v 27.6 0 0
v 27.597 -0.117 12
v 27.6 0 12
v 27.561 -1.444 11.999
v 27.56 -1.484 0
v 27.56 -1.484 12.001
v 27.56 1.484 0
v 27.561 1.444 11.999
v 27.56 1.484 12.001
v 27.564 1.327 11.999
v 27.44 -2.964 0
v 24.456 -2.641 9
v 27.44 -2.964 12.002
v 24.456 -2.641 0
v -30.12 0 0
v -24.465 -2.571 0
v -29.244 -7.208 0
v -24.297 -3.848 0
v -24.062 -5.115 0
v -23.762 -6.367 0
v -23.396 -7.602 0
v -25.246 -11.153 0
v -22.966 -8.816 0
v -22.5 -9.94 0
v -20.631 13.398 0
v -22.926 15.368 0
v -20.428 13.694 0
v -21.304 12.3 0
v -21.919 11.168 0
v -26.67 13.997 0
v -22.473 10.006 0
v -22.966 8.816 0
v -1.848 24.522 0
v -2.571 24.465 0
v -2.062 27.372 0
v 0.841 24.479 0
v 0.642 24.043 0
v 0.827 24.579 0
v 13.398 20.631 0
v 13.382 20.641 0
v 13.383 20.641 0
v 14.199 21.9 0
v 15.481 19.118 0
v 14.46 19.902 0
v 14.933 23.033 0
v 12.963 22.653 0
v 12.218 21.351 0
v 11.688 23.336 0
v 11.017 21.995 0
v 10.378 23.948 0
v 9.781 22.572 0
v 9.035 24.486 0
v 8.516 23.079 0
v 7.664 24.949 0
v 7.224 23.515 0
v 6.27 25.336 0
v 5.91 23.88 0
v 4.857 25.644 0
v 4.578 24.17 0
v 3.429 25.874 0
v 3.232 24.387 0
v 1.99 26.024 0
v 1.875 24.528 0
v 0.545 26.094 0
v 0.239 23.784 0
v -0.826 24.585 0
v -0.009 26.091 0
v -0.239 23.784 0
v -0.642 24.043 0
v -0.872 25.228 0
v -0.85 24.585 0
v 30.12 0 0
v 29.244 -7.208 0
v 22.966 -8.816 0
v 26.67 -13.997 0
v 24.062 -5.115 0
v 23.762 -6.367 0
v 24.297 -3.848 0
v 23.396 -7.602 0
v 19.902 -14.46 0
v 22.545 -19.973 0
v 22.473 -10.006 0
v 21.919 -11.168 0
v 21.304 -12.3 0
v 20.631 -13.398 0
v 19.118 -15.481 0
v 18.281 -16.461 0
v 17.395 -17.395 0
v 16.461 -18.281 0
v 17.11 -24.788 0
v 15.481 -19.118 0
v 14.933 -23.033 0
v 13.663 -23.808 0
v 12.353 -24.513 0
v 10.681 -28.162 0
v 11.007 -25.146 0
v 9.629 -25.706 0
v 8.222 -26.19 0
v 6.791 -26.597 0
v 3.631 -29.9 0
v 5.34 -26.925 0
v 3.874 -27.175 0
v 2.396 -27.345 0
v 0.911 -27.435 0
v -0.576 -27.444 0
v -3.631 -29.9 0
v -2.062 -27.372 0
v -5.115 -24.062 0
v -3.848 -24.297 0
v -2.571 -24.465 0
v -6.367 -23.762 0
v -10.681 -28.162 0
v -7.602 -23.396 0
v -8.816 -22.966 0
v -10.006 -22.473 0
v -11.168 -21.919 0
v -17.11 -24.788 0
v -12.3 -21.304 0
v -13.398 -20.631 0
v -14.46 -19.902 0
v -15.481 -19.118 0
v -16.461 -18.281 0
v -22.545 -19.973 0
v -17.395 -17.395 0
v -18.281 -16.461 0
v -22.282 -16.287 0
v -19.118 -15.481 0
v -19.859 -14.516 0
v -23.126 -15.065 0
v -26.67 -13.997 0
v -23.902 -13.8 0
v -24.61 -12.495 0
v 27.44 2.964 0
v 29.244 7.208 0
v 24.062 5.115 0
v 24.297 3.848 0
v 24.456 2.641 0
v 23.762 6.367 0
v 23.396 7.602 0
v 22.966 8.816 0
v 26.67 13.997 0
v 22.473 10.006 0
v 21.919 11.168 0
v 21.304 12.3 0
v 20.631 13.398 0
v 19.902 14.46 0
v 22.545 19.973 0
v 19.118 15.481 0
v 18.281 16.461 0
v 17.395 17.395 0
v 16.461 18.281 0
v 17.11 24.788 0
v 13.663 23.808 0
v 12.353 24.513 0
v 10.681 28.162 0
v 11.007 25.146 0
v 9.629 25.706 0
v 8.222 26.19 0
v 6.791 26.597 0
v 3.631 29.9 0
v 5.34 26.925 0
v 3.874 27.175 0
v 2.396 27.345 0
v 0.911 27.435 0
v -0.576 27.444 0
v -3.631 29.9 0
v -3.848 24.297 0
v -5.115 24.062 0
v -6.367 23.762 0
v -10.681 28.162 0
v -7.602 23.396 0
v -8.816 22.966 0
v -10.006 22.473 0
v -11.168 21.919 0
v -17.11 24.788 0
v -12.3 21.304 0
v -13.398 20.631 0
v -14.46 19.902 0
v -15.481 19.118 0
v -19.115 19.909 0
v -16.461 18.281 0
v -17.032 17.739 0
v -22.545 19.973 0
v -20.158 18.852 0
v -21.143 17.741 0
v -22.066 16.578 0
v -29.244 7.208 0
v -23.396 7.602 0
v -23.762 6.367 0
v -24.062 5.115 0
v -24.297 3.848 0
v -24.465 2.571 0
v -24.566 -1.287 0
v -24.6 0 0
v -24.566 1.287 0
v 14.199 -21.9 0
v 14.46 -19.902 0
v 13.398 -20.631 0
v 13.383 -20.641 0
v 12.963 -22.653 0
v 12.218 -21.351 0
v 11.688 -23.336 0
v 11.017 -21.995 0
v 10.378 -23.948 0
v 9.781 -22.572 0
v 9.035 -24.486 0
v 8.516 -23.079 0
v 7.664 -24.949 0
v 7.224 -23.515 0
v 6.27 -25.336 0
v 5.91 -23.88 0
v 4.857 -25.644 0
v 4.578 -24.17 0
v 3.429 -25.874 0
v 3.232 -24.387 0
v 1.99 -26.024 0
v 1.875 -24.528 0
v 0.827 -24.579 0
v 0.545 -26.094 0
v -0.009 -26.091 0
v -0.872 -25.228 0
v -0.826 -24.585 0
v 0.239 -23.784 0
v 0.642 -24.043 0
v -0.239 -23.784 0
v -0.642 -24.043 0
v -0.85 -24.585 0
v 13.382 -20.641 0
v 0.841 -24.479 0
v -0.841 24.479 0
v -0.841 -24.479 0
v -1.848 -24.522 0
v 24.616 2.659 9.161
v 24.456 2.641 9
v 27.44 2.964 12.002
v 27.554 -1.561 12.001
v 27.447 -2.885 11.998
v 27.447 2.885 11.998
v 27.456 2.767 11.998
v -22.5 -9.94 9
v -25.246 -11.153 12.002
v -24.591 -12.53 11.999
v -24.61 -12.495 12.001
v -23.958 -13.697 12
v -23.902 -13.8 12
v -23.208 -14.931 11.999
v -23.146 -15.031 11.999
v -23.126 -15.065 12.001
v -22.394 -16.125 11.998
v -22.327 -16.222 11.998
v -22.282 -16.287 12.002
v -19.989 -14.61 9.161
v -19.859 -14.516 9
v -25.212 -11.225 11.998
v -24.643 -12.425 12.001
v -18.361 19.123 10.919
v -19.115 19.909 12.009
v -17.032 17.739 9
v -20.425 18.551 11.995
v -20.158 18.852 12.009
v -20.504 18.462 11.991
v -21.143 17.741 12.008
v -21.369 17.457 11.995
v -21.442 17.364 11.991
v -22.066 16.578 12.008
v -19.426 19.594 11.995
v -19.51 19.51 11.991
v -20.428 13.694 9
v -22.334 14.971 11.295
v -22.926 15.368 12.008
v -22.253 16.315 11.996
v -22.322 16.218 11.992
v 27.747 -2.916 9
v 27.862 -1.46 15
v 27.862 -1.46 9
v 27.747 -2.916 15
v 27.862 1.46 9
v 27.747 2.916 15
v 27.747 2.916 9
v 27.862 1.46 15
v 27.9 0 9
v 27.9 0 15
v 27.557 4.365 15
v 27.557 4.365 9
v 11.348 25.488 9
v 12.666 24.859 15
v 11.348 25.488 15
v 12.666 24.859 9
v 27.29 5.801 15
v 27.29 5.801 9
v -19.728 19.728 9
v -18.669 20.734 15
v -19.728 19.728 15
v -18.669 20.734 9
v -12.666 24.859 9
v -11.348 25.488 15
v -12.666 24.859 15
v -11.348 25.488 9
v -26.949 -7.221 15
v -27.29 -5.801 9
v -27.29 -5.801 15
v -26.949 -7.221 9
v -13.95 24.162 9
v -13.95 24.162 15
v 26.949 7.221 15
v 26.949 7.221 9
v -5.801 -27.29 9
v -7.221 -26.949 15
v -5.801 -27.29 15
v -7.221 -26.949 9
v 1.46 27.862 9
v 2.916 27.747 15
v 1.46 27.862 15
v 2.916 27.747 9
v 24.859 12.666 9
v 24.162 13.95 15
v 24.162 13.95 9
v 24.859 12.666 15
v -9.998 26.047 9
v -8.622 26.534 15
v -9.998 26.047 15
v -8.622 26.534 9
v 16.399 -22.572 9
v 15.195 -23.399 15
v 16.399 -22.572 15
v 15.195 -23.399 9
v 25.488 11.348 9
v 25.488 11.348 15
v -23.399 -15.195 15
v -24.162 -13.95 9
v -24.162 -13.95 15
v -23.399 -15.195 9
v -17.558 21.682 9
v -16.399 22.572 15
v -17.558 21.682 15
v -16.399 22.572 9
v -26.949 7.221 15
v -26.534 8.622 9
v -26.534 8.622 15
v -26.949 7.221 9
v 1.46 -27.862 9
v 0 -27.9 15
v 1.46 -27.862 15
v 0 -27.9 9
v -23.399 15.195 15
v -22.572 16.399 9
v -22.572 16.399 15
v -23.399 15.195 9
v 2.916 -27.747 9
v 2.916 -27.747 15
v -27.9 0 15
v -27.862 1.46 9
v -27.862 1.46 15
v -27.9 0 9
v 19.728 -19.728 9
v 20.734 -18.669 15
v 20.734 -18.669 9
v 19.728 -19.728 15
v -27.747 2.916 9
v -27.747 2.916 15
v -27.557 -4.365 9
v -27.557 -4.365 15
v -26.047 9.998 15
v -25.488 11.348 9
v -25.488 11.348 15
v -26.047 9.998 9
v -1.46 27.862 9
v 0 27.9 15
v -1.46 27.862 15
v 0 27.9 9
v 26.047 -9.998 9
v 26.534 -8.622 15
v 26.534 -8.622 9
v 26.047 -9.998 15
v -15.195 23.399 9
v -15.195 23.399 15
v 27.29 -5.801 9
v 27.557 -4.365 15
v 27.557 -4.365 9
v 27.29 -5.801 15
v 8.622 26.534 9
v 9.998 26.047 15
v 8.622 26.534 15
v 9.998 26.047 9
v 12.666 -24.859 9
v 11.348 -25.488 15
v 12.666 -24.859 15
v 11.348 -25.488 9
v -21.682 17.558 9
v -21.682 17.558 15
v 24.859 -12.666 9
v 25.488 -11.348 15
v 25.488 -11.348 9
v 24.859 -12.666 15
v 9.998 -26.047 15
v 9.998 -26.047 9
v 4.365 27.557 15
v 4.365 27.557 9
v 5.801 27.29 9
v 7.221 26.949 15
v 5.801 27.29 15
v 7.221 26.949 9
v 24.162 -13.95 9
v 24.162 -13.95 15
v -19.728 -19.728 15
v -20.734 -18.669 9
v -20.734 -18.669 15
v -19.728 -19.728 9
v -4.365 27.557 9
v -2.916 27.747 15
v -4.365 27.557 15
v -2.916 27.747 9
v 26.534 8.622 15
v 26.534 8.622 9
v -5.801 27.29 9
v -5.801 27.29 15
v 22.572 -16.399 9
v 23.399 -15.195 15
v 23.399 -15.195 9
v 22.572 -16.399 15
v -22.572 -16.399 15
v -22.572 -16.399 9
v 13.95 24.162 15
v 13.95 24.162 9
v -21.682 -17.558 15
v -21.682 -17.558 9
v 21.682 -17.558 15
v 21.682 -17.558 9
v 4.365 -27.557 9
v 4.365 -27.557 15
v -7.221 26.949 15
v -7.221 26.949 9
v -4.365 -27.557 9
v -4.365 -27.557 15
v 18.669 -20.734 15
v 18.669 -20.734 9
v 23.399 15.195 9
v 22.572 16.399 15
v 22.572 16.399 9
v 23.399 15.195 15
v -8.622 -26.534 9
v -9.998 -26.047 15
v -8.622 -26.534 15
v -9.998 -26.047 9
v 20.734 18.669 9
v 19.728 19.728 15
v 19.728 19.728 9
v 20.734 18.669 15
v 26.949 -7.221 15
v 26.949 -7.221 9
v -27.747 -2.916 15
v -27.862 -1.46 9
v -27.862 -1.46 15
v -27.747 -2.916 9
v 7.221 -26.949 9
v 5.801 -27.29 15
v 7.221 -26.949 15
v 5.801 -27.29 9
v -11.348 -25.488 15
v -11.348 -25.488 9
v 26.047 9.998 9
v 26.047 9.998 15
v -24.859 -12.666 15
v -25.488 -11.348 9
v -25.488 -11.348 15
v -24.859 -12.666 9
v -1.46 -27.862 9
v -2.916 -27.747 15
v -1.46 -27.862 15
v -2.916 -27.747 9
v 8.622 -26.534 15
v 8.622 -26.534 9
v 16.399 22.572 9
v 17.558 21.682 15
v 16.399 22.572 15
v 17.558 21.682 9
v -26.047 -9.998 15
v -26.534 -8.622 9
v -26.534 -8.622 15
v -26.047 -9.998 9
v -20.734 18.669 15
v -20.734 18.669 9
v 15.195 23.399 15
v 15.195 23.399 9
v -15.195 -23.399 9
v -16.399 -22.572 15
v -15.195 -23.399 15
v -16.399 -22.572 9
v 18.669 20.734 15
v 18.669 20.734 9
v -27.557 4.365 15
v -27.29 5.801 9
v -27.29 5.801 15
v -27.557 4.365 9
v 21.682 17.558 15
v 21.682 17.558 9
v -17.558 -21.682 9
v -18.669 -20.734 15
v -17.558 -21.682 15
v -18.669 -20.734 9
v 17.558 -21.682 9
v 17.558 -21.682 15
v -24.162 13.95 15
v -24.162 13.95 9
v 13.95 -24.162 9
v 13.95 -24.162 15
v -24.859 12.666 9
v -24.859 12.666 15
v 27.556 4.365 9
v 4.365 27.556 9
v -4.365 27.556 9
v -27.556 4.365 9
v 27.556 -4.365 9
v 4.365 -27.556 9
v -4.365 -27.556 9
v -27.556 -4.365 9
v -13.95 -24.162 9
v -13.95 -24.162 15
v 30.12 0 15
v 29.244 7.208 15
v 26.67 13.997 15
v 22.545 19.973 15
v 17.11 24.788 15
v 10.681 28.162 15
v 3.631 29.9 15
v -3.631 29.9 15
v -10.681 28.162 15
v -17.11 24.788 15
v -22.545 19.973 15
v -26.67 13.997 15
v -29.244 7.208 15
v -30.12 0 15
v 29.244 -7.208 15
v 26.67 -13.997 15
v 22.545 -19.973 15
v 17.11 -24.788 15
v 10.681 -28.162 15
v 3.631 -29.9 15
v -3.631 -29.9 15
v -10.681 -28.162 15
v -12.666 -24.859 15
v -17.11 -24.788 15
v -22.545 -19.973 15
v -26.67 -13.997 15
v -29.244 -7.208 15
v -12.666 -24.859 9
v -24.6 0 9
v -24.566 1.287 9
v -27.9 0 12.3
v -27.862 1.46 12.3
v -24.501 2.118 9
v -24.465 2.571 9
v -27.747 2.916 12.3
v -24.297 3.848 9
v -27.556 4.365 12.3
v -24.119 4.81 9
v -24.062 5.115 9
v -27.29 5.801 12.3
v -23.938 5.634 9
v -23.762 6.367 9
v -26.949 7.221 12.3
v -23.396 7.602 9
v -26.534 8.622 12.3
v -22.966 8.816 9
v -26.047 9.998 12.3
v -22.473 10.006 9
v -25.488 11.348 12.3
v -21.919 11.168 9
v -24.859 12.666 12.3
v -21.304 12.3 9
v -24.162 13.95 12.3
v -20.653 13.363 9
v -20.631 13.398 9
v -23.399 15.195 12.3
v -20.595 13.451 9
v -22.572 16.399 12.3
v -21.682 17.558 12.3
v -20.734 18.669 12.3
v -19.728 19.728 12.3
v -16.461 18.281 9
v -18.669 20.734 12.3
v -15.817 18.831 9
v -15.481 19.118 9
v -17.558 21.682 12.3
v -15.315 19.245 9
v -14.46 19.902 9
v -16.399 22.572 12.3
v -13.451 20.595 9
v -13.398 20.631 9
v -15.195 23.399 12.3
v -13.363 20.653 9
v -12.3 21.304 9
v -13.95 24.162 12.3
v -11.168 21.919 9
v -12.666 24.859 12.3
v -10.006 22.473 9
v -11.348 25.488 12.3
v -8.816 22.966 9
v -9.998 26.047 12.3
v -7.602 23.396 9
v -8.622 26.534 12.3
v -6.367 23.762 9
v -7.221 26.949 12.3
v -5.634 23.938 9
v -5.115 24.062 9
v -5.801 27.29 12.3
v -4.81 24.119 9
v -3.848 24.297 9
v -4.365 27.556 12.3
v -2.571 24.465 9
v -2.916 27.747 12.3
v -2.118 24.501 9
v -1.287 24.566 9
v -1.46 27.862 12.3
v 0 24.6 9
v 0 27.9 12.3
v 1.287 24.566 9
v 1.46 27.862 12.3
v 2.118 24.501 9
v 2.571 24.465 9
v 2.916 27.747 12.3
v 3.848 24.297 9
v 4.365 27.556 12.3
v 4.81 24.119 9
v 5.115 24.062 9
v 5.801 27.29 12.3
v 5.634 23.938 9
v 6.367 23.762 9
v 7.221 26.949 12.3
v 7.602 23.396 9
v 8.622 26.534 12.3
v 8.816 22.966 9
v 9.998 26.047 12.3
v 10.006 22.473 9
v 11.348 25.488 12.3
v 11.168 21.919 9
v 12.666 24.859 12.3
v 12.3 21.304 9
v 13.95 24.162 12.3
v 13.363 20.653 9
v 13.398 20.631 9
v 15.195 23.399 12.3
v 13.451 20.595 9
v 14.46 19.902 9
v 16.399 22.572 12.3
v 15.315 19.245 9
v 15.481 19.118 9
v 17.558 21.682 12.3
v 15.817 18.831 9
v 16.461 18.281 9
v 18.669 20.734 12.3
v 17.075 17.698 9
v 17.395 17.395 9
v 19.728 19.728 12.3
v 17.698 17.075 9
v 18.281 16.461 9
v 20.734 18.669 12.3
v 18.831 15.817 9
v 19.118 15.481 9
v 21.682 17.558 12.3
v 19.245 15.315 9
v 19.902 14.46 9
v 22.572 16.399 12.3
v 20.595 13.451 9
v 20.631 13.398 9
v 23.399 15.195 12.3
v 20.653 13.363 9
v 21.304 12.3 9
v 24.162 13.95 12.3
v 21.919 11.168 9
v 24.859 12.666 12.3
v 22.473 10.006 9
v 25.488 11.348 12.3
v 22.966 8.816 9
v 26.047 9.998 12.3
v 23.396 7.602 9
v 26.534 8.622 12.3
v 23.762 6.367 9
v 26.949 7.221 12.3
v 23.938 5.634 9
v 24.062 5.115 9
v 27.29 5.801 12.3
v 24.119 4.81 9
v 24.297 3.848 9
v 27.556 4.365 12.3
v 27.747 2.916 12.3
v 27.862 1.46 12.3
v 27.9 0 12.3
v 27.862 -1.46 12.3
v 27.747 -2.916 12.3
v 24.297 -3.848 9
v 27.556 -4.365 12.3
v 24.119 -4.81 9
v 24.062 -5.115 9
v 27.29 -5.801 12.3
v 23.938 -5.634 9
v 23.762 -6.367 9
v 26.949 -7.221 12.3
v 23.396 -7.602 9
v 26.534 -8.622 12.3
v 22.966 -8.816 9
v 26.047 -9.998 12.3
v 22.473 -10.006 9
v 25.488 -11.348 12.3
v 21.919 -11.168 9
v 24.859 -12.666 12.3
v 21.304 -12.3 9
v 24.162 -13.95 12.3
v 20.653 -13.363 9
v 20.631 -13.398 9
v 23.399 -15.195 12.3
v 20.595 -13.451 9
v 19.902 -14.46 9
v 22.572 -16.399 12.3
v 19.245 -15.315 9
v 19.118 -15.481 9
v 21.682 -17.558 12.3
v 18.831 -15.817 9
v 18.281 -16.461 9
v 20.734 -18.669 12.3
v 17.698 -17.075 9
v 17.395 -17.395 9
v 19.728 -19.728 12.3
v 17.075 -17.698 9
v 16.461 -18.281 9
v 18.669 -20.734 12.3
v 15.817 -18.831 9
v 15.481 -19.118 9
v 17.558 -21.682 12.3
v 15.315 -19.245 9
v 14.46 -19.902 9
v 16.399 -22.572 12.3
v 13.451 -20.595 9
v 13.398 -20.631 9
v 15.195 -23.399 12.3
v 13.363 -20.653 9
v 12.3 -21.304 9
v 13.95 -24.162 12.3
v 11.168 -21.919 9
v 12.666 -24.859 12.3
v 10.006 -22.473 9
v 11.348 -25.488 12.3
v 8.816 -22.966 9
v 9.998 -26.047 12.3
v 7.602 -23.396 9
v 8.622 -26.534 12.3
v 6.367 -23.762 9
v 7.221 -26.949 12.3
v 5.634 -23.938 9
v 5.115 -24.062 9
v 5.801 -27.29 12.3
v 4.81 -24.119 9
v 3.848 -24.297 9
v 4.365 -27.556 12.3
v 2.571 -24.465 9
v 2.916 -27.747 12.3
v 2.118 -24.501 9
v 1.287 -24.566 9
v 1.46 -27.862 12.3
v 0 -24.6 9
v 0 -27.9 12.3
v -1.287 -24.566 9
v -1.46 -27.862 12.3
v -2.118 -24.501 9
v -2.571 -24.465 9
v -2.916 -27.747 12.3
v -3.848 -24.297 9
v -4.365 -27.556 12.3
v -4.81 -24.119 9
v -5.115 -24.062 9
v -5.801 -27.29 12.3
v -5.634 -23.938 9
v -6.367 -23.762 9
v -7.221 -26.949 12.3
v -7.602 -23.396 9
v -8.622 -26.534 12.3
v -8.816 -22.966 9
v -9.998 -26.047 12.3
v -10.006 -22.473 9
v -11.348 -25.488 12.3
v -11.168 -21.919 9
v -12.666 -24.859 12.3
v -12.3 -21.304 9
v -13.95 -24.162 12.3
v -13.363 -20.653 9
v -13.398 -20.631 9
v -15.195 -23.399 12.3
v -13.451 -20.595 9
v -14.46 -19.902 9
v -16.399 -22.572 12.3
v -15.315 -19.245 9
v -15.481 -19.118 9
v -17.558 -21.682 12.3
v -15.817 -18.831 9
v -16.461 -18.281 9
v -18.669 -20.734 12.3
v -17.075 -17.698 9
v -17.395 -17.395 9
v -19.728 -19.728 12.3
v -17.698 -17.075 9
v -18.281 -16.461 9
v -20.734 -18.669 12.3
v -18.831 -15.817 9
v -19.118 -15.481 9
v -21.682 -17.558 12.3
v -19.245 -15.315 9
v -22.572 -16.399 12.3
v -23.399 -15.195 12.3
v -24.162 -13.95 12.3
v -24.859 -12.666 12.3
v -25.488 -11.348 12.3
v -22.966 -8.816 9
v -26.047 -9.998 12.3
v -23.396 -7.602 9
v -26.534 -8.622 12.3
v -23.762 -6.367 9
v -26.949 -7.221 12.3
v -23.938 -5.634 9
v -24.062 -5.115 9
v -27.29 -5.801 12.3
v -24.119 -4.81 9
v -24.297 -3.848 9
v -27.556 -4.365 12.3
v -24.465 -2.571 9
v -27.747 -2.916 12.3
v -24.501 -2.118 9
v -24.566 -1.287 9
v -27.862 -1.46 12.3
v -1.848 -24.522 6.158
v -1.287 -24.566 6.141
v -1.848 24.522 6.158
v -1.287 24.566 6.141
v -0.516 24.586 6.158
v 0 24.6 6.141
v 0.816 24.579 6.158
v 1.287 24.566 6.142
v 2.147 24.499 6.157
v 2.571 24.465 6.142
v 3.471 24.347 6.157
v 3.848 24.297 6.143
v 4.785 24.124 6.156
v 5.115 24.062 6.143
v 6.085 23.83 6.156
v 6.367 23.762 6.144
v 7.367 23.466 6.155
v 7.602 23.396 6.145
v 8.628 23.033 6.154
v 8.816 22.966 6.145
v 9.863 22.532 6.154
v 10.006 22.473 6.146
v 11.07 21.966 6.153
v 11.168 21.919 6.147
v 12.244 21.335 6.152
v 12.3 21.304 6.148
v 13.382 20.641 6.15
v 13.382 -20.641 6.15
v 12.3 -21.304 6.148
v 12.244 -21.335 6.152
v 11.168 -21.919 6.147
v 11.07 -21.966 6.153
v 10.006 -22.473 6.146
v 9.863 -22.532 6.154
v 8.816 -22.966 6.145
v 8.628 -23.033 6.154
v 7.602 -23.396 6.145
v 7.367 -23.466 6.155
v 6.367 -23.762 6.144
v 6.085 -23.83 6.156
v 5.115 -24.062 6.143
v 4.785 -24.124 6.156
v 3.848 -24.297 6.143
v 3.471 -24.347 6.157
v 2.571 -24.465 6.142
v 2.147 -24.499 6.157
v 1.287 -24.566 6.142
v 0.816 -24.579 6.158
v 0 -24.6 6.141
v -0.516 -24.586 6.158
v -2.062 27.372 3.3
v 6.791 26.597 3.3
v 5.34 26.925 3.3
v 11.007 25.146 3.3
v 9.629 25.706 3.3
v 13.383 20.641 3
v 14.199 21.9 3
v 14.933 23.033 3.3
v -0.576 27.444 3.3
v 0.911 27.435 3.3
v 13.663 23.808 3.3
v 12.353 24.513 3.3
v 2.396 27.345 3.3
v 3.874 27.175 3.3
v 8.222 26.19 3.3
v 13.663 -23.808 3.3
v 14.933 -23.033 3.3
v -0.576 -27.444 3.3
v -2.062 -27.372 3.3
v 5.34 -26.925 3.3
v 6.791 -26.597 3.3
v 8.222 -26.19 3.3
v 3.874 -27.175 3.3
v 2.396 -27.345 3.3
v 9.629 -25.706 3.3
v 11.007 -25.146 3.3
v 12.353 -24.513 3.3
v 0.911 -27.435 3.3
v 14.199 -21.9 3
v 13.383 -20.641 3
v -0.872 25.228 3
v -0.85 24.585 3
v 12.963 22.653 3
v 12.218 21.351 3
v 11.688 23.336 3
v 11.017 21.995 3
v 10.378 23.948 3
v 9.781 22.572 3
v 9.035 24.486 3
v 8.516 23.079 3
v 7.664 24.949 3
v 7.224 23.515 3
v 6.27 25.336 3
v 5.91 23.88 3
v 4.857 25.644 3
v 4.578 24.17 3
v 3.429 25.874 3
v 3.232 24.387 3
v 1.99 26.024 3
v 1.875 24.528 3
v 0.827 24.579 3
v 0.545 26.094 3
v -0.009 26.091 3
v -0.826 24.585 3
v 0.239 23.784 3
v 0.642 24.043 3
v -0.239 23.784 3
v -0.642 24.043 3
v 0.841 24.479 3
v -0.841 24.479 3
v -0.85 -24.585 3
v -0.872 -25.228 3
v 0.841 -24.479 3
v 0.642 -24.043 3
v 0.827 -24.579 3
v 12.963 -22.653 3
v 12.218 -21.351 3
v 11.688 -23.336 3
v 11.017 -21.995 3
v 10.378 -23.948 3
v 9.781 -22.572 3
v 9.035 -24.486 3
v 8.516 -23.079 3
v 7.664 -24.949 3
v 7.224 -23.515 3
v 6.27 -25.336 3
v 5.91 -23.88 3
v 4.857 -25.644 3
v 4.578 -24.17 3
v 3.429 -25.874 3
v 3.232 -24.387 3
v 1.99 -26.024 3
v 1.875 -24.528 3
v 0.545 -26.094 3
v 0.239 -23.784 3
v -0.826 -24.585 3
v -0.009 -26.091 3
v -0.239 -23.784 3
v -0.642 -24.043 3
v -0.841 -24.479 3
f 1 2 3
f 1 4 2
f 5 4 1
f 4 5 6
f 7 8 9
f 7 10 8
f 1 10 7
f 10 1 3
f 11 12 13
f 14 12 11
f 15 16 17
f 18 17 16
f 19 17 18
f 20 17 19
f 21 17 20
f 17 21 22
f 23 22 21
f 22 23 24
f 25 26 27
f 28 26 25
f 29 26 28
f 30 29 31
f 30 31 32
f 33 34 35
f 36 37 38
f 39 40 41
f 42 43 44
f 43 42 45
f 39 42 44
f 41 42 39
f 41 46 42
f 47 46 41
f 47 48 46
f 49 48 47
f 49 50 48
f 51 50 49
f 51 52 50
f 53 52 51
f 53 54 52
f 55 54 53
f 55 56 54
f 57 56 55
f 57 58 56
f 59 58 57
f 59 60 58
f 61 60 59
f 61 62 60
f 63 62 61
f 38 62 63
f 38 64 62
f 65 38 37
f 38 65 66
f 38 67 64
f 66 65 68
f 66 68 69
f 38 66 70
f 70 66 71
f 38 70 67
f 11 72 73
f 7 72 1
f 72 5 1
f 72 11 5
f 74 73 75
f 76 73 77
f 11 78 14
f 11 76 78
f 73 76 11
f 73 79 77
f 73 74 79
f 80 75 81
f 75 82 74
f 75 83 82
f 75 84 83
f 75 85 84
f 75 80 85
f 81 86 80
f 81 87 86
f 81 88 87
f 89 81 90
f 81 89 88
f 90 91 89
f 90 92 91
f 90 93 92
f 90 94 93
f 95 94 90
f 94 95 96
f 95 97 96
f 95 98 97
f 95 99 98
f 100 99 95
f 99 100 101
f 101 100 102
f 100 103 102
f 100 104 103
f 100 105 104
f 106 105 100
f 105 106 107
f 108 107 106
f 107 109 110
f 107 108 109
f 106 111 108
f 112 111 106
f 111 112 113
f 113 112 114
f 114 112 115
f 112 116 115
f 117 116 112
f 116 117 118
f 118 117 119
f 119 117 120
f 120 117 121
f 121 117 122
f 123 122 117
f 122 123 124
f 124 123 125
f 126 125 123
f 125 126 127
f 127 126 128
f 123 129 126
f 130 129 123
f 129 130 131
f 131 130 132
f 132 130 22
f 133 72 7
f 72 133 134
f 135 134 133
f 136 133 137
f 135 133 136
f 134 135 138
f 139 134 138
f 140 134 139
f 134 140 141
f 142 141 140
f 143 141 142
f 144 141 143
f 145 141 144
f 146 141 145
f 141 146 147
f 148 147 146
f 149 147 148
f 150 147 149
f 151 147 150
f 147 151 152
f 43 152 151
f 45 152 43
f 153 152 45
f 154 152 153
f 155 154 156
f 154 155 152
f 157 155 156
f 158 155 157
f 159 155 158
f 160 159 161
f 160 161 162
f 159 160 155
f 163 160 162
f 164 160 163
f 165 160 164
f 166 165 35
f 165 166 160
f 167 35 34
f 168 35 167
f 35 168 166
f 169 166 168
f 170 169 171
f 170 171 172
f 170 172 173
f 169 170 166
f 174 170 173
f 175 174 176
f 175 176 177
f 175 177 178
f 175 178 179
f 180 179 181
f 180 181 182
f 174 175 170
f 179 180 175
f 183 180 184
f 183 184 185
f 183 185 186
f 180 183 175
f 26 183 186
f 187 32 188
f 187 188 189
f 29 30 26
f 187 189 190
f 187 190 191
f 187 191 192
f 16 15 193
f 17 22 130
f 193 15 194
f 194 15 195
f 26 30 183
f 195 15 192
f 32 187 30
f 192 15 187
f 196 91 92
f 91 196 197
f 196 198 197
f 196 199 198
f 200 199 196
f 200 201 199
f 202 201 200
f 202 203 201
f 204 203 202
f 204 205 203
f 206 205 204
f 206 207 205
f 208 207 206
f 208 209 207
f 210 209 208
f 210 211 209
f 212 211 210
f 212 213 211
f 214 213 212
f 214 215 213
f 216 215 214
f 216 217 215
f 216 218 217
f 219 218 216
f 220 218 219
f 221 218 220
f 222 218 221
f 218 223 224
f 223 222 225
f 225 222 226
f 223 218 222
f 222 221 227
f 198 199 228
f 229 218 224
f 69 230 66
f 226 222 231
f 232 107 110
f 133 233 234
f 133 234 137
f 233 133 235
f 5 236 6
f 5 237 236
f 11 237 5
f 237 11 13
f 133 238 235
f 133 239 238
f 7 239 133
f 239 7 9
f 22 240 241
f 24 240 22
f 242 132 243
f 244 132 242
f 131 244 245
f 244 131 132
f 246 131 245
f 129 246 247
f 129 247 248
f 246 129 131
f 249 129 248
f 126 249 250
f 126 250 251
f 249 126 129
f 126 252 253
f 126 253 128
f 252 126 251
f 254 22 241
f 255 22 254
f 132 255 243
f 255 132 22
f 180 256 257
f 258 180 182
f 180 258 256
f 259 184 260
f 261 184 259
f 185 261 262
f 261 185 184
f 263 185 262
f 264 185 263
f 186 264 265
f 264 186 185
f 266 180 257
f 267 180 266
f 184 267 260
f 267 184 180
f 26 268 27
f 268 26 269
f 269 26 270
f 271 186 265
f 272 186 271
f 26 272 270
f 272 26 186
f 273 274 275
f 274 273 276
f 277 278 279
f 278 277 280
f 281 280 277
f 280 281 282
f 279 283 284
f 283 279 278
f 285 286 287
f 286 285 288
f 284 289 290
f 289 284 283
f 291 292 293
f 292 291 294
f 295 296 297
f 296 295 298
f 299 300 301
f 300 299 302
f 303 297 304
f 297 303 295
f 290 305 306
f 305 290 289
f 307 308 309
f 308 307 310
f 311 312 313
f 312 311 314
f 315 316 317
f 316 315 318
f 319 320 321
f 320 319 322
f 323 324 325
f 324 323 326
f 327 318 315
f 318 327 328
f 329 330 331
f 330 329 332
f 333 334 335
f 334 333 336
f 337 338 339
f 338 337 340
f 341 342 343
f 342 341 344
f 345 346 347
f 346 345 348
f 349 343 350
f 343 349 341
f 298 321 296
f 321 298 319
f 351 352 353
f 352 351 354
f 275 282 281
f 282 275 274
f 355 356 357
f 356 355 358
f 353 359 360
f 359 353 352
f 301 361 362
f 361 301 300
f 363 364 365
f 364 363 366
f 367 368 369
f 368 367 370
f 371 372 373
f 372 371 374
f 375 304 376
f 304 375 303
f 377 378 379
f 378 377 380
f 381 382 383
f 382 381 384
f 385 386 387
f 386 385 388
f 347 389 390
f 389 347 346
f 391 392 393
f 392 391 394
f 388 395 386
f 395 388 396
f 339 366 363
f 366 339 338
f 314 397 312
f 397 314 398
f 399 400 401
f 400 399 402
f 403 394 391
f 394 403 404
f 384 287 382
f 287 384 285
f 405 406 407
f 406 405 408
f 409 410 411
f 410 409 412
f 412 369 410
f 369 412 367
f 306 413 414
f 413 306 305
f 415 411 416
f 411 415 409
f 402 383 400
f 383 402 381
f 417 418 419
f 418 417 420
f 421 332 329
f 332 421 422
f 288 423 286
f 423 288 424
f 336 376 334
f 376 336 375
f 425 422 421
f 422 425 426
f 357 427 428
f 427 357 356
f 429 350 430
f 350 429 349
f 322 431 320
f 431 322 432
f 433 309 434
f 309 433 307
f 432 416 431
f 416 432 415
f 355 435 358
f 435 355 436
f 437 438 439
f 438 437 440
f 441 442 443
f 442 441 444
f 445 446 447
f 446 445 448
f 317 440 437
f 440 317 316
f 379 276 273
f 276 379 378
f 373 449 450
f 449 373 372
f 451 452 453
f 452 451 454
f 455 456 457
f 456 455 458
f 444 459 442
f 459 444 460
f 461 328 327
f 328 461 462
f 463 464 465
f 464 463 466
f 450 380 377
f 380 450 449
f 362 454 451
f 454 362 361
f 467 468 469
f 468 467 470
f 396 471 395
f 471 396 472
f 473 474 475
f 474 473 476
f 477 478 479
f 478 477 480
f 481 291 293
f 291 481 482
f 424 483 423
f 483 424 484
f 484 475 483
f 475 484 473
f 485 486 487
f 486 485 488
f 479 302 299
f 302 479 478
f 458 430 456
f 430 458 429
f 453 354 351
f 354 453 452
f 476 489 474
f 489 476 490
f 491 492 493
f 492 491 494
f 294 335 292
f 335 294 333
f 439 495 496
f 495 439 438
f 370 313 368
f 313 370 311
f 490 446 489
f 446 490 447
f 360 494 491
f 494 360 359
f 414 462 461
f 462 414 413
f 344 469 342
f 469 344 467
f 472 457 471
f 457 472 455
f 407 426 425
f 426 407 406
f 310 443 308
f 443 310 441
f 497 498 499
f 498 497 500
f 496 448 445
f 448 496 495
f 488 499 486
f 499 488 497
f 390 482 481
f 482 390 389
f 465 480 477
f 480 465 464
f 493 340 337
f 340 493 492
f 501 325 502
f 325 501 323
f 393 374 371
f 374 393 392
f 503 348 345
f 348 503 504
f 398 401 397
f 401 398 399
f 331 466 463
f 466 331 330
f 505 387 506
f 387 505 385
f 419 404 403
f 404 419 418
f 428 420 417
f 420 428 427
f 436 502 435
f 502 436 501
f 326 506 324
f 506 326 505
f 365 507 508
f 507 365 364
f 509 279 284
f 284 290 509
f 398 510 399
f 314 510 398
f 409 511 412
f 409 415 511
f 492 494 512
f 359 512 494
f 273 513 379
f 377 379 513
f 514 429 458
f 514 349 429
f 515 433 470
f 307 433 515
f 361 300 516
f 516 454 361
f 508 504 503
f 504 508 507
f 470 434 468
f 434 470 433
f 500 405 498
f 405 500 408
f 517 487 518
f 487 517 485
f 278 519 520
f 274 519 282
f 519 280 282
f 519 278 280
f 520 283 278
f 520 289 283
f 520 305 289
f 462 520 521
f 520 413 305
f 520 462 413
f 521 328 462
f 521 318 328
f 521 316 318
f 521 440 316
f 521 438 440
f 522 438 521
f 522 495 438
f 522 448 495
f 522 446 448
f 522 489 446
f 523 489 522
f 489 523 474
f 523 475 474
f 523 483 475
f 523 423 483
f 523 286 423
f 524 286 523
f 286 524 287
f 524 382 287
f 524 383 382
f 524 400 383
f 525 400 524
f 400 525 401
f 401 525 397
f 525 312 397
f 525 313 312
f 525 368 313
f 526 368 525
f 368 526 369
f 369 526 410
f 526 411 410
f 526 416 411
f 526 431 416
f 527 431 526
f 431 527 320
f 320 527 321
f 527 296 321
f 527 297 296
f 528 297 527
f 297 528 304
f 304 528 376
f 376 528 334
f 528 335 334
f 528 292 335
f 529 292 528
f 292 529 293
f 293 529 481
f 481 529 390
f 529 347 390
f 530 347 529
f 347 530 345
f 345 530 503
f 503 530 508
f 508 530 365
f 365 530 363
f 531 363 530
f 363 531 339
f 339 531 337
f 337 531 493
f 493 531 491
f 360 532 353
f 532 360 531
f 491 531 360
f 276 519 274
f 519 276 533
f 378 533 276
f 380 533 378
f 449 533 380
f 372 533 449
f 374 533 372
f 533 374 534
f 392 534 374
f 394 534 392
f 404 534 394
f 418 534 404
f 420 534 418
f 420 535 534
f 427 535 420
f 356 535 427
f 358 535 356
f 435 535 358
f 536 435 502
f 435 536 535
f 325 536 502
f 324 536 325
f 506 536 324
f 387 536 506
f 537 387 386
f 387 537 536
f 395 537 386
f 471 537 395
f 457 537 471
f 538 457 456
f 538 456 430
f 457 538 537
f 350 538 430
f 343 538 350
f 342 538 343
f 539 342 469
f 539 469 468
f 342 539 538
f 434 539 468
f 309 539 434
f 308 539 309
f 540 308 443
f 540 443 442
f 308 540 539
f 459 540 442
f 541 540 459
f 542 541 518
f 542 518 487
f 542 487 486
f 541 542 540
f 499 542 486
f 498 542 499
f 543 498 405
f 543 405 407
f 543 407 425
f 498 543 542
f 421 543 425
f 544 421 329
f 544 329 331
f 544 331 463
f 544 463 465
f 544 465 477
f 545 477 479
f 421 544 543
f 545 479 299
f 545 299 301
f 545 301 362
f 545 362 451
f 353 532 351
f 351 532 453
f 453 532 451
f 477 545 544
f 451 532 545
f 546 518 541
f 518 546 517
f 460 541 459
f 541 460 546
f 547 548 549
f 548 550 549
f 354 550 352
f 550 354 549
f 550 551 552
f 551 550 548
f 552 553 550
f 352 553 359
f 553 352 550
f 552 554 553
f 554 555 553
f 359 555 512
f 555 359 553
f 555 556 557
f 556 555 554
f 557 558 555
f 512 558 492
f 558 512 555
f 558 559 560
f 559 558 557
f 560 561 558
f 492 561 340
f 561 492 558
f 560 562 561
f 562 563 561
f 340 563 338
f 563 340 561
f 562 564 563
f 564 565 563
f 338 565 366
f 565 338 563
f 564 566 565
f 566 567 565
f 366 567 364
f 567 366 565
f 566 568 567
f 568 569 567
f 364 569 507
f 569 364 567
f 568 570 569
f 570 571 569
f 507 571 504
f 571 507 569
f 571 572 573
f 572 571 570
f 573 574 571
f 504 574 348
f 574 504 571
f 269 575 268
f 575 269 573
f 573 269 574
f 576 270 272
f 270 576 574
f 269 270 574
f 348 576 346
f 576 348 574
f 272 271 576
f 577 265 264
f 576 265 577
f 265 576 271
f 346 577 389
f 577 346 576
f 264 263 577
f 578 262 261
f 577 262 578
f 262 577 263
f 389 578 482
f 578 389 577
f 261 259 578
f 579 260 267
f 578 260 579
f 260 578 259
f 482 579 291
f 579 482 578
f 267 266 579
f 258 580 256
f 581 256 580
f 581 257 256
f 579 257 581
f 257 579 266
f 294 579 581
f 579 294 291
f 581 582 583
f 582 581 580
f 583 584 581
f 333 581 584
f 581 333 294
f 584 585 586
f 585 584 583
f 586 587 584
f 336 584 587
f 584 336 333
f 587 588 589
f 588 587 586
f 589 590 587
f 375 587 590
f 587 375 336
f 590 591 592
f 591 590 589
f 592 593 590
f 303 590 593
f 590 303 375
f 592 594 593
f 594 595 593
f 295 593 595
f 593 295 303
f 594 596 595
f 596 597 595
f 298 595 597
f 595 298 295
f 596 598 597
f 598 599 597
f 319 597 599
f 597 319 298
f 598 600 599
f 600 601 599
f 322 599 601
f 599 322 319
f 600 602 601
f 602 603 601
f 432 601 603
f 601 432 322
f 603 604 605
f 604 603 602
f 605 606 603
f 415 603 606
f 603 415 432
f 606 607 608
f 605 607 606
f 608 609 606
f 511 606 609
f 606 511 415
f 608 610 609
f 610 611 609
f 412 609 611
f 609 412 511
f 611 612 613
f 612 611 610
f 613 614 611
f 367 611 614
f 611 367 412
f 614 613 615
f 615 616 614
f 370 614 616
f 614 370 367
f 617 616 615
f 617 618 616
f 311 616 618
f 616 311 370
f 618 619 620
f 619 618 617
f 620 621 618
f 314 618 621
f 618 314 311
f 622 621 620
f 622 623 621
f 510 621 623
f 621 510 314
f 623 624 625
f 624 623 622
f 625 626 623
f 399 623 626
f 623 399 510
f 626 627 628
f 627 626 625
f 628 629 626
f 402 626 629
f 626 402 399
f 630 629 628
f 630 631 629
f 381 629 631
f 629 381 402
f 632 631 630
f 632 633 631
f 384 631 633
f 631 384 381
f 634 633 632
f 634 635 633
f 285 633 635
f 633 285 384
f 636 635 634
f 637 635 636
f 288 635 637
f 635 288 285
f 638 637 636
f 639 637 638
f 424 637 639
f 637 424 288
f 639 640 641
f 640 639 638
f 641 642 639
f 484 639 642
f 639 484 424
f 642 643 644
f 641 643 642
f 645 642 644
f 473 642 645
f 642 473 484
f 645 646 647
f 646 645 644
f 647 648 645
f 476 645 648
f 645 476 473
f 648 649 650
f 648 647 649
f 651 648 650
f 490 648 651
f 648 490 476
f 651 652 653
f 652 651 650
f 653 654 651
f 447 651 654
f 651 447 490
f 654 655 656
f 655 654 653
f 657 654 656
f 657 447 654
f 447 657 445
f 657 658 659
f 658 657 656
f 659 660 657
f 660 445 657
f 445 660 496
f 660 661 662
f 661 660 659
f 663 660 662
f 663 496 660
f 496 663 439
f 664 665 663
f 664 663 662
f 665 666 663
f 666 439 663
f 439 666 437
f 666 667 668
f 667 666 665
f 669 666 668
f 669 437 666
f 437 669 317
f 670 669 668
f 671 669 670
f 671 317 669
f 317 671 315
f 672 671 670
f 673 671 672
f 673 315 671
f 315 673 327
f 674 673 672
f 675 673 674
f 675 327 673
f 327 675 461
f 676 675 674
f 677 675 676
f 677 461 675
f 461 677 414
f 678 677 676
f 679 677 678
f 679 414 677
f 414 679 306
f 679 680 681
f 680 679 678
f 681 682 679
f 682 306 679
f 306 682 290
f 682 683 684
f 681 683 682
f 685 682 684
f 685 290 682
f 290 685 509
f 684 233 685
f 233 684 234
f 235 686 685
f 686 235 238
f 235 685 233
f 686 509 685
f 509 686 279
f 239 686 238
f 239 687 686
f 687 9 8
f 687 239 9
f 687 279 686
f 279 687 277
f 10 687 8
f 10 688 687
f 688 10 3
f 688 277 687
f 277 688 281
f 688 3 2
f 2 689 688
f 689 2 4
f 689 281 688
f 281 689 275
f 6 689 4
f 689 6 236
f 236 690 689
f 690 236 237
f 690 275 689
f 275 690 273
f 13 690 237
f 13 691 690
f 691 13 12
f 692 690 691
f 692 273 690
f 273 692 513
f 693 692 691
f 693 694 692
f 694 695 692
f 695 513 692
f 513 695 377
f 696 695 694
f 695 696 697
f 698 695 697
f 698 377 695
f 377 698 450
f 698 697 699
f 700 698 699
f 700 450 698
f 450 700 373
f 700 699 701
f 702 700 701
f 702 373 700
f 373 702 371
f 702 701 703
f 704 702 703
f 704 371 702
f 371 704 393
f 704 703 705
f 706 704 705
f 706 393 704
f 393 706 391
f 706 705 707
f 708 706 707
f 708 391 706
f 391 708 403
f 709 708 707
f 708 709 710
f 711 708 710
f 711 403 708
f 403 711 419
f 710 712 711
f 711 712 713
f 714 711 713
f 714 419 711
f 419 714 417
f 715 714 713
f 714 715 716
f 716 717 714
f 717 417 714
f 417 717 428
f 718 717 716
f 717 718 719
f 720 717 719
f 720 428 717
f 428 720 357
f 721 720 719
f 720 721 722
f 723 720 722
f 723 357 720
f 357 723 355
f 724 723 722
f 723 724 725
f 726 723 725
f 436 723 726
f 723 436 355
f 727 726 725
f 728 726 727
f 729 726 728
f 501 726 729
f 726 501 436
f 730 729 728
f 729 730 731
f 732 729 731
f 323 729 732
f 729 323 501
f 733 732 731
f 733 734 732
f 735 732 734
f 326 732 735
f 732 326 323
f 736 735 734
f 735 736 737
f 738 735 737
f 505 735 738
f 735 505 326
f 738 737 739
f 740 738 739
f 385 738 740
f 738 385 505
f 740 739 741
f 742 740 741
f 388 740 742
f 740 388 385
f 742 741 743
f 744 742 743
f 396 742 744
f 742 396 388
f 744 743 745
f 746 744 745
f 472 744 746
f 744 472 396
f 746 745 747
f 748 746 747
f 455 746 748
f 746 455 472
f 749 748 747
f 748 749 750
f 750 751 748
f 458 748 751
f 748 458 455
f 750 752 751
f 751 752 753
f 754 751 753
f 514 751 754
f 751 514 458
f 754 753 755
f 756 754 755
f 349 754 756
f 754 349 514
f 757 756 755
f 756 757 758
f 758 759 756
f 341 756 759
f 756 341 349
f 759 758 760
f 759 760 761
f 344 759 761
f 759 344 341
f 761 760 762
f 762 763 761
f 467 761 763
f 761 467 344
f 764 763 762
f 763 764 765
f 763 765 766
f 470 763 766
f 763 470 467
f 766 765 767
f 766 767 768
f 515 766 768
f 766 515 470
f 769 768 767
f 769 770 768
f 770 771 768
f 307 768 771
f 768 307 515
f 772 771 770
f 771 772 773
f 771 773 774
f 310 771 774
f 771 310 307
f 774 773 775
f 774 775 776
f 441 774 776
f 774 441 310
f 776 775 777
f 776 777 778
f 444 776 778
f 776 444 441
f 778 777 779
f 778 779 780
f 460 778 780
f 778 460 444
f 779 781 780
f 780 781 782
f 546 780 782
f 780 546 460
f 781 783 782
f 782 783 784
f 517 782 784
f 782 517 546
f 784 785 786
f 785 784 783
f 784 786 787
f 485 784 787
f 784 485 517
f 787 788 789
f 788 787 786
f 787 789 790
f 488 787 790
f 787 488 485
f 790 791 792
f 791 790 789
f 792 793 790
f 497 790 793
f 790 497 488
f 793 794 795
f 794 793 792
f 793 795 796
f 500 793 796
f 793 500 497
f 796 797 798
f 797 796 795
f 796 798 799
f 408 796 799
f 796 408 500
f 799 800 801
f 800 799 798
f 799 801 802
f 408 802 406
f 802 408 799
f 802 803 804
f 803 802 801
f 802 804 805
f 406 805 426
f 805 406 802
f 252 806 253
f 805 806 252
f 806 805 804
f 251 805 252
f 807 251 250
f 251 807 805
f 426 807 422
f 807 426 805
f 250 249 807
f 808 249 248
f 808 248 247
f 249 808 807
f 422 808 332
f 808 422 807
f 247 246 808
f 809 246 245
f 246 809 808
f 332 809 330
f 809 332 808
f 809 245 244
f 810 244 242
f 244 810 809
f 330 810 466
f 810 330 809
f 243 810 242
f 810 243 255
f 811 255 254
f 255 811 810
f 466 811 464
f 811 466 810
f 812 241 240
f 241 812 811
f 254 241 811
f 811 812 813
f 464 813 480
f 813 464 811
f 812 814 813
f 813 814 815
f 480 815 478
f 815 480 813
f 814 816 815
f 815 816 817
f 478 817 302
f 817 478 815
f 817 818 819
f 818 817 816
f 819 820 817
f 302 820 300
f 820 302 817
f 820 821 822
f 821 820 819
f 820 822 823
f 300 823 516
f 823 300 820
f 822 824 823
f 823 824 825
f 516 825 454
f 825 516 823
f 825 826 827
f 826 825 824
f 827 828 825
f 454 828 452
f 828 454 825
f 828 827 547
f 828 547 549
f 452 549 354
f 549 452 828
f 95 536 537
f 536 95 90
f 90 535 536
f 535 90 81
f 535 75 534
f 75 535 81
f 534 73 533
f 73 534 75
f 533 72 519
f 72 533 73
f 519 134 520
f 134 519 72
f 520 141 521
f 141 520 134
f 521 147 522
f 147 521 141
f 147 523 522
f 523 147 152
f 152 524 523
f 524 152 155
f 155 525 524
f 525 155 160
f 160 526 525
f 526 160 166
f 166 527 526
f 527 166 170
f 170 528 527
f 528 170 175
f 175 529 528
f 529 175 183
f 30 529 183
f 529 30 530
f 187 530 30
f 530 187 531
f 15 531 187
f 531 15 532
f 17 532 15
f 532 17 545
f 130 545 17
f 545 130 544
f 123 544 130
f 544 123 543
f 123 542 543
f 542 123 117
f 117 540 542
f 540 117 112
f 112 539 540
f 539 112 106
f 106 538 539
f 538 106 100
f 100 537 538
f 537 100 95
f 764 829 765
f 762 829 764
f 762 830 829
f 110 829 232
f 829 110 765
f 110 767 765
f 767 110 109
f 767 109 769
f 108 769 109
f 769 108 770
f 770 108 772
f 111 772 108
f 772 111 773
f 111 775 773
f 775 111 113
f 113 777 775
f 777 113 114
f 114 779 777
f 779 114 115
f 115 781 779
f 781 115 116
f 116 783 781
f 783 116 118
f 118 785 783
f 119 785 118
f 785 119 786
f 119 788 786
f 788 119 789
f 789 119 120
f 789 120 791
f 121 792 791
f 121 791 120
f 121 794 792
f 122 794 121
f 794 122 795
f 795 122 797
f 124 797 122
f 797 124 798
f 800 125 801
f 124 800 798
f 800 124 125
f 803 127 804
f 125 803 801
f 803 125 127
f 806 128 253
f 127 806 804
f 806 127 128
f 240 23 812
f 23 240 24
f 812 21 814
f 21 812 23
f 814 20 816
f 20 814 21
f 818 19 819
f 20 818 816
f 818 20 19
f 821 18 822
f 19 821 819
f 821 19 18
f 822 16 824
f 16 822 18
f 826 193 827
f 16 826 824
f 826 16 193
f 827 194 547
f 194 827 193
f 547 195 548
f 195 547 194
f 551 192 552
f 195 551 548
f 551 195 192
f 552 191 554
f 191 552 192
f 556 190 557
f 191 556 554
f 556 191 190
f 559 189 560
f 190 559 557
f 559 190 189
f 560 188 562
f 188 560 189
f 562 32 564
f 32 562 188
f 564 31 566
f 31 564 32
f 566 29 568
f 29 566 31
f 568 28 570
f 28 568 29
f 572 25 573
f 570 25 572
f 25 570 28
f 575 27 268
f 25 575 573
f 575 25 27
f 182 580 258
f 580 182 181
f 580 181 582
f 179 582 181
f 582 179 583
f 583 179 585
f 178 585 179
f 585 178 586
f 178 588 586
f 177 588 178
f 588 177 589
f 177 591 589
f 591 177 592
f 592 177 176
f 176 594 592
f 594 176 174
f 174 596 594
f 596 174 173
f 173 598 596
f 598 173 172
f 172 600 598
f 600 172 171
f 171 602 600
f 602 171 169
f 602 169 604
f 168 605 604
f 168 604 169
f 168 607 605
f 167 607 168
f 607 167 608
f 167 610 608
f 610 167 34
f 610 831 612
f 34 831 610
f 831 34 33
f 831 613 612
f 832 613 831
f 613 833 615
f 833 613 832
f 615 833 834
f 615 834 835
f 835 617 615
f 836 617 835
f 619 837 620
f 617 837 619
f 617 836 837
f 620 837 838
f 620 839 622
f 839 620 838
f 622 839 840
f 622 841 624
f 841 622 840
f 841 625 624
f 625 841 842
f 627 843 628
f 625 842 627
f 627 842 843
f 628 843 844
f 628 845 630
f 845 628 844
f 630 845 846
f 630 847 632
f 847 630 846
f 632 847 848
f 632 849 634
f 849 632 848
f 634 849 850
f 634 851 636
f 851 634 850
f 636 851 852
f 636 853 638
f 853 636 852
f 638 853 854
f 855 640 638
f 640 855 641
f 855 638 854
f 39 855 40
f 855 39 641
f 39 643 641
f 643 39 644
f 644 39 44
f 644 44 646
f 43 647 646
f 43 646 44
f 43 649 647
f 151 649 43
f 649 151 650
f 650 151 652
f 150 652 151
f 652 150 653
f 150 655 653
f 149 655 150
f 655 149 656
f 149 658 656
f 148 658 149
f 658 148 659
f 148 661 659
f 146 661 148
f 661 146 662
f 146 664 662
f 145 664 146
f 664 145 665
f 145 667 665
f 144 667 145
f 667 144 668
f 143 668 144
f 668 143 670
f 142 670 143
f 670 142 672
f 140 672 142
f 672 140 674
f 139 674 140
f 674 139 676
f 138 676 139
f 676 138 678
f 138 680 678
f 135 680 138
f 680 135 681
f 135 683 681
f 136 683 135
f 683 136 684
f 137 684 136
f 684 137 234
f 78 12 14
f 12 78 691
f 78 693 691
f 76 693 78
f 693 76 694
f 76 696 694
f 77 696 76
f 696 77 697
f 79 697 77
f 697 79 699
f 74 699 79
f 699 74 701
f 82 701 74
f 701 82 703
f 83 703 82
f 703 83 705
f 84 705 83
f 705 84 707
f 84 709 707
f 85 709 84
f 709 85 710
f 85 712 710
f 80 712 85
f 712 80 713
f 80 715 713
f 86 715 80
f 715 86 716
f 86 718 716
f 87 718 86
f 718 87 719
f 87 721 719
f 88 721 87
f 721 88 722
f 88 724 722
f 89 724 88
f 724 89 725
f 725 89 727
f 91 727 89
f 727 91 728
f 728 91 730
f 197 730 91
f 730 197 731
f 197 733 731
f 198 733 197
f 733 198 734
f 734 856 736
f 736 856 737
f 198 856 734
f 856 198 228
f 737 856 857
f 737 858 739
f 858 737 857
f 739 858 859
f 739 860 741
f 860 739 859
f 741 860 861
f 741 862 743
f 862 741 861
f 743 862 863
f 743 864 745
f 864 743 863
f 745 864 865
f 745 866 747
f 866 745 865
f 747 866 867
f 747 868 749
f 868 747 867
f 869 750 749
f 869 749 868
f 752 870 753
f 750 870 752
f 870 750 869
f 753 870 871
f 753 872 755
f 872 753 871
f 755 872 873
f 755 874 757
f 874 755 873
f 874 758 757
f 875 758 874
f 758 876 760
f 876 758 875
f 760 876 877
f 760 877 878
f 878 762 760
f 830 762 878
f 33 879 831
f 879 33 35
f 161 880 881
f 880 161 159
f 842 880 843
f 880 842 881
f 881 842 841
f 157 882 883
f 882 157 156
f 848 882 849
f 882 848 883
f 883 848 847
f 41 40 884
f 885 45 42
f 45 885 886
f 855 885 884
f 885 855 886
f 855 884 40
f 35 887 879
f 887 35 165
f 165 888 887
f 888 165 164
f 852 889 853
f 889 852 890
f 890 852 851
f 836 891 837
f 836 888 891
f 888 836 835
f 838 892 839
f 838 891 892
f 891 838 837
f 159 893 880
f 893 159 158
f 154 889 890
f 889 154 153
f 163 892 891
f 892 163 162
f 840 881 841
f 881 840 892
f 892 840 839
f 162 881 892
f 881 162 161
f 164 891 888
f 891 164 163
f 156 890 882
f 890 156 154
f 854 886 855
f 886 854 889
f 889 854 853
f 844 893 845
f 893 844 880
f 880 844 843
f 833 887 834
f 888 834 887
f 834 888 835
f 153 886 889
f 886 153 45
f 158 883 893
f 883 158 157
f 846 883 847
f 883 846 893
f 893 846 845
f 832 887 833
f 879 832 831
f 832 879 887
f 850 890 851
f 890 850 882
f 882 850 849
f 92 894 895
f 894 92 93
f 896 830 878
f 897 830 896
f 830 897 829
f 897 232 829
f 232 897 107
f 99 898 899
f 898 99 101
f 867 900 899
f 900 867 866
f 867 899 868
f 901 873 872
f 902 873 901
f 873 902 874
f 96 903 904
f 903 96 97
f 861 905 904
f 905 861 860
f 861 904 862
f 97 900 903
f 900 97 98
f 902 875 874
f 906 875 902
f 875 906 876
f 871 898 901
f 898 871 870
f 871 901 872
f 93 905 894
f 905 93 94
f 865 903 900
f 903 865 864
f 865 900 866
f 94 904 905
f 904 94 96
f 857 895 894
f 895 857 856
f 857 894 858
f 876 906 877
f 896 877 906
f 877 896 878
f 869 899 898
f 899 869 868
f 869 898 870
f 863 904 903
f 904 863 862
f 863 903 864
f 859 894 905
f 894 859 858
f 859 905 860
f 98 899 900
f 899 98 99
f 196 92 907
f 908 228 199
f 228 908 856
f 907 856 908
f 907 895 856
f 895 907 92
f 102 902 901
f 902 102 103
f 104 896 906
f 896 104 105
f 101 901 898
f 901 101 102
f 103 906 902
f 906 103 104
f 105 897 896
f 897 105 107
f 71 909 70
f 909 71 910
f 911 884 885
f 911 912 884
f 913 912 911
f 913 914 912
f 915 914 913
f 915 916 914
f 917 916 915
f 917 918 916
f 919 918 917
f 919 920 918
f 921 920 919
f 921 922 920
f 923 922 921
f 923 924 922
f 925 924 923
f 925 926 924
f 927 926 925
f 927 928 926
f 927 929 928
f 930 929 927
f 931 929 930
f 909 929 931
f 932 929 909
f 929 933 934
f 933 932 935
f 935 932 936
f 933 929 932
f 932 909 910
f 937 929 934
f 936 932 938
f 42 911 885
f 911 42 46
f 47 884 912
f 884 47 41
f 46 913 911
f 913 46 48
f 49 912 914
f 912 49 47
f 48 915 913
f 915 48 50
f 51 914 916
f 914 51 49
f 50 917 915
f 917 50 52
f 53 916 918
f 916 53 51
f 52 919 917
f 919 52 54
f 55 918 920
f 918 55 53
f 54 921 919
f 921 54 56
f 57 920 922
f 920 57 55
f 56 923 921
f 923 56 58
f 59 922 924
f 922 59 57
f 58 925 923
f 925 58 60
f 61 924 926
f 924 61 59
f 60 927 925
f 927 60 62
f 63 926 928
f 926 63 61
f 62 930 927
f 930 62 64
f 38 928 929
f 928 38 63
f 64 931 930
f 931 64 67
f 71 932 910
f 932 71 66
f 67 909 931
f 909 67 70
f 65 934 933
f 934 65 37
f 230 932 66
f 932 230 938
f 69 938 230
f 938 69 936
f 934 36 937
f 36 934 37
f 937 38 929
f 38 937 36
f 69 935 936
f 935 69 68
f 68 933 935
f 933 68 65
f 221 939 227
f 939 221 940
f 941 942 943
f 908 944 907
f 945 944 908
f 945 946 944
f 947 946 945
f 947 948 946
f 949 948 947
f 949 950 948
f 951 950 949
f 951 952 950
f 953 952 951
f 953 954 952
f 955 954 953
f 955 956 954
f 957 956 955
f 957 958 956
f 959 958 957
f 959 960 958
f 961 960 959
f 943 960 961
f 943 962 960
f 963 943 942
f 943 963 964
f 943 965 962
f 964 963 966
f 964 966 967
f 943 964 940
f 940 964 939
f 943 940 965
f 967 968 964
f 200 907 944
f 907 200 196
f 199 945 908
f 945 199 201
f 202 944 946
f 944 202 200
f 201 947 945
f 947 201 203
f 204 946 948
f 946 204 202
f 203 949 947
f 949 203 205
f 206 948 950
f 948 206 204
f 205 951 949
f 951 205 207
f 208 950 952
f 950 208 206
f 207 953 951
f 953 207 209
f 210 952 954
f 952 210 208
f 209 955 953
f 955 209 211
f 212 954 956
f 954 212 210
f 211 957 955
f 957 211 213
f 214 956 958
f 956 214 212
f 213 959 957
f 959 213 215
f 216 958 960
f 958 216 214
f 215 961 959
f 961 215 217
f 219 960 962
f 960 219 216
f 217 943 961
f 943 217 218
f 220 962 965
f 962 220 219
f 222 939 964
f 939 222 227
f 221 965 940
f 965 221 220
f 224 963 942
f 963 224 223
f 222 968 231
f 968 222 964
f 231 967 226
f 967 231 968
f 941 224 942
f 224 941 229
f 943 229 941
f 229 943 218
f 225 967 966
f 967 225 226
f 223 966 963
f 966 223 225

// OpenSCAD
// file: common.scad
// Polygon is centered on origin, with "first" point along X axis
module RegularPolygon(numCorners, outerRadius) {
    points = [
        for (pointNum = [0 : numCorners - 1])
            [cos(pointNum / numCorners * 360) * outerRadius, sin(pointNum / numCorners * 360) * outerRadius]
    ];
    polygon(points);
};

// Returns multipler to get inner radius (closest distance to origin) from a regular polygon with outer radius of 1
function regularPolygonInnerRadiusMultiplier(numCorners) =
    let (pt = ([1, 0] + [cos(1 / numCorners * 360), sin(1 / numCorners * 360)]) / 2)
        sqrt(pt[0]*pt[0] + pt[1]*pt[1]);
// file: rotate_extrude.scad
// From http://forum.openscad.org/rotate-extrude-angle-always-360-td19035.html

module rotate_extrude2(angle=360, convexity=2, size=1000) {

  module angle_cut(angle=90,size=1000) {
    x = size*cos(angle/2);
    y = size*sin(angle/2);
    translate([0,0,-size]) 
      linear_extrude(2*size) polygon([[0,0],[x,y],[x,size],[-size,size],[-size,-size],[x,-size],[x,-y]]);
  }

  // support for angle parameter in rotate_extrude was added after release 2015.03 
  // Thingiverse customizer is still on 2015.03
  angleSupport = (version_num() > 20150399) ? true : false; // Next openscad releases after 2015.03.xx will have support angle parameter
  // Using angle parameter when possible provides huge speed boost, avoids a difference operation

  if (angleSupport || angle == 360) {
    rotate_extrude(angle=angle,convexity=convexity)
      children();
  } else {
    rotate([0,0,angle/2]) difference() {
      rotate_extrude(convexity=convexity) children();
      angle_cut(angle, size);
    }
  }
}
// file: sharedparams.scad
use <common.scad>

// Main parameters
compartmentDiameter = 40;
compartmentHeight = 30;
numRings = 2;
positionLabels = [
    "A", "B", "C", "D", "E", "F", "G", "H", "I", "J",
    "K", "L", "M", "N", "O", "P", "Q", "R", "S", "T",
    "U", "V", "W", "X", "Y", "Z"
];
numPositions = len(positionLabels);

// Inner shell
isInnerRadius = compartmentDiameter / 2;
isThick = 2;
isOuterRadius = isInnerRadius + isThick;
isInnerHeight = compartmentHeight;
isBaseThick = 3;
isOuterHeight = isInnerHeight + isBaseThick;
isProngSpanAngle = 10; // angular width of the lock prongs
isProngOffsetZ = -1; // vertical clearance between each ring and the prongs below it in locked position

// Outer shell
isOsClearance = 0.3; // Clearance on radius
osInnerRadius = isOuterRadius + isOsClearance;
osThick = 2;
osOuterRadius = osInnerRadius + osThick;
osInnerHeight = isInnerHeight;
osBaseThick = isBaseThick;
osOuterHeight = osInnerHeight + osBaseThick;
osSlotClearance = 0.3; // Clearance on each side of the fins to the outer shell slots
osSlotSpanAngle = isProngSpanAngle + 360 * osSlotClearance / (2 * PI * osInnerRadius) * 2;

// Rings
ringSpacing = compartmentHeight / numRings;
osRingClearance = 0.3;
osProngProtrusion = 3; // Amount lock prongs protrude from the OD of the outer shell
isProngProtrusion = isOsClearance + osThick + osProngProtrusion; // amount the lock prongs extend from the OD of the inner shell cylinder
prongHeight = osProngProtrusion + 1; // total height of lock prongs, at the OD of the outer shell
ringInnerRadius = osOuterRadius + osRingClearance;
ringProngEndClearance = 0.3; // Clearance between the end of the prongs and the ring
ringProngCoverThick = 2;
ringMinThick = osProngProtrusion + ringProngCoverThick + ringProngEndClearance;
ringOuterMinRadius = ringInnerRadius + ringMinThick;
ringOuterRadius = ringOuterMinRadius / regularPolygonInnerRadiusMultiplier(numPositions);
ringHeight = isInnerHeight / numRings;
ringSlotClearance = 0.5;
ringSlotSpanAngle = isProngSpanAngle + 360 * ringSlotClearance / (2 * PI * ringInnerRadius) * 2;
prongCoverHeightClearance = 1;

// Detents
detentDepth = 0.85;  // radius of detent cylindrical depressions
detentArm1Angle = 90; // Angle of the part of the arm that actually contacts the detent
detentArm2Angle = (numPositions % 2 == 0) ? detentArm1Angle + 180 : detentArm1Angle + 180 - (360 / numPositions / 2); 
detentArmHeight = 3;
detentArmThick = 1.5;
detentArmLength = 15;

osBaseRadius = ringOuterMinRadius;

// Misc
latchAngles = [ 0, 180+30, 180-40 ];

// System
$fa = 3;
$fs = 0.5;
// main file
include <sharedparams.scad>
use <rotate_extrude.scad>
use <common.scad>

module Ring() {
    detentArmSpanAngle = detentArmLength / (2 * PI * ringInnerRadius) * 360;
    detentKeySpanAngle = detentDepth * 2 / (2 * PI * ringInnerRadius) * 360;
    
    module DetentArm() {
        // Generates detent arm such that detent cylinder is centered on X axis
        detentArmInnerRadius = ringInnerRadius;
        detentArmOuterRadius = detentArmInnerRadius + detentArmThick;
        // Arm
        difference() {
            rotate([0, 0, -detentArmSpanAngle + detentKeySpanAngle/2])
                rotate_extrude2(angle=detentArmSpanAngle)
                    translate([detentArmInnerRadius, 0])
                        square([detentArmThick, detentArmHeight]);
            // Chamfer the end
            linear_extrude(1000)
                polygon([
                    [detentArmOuterRadius, 0],
                    [0, detentArmOuterRadius],
                    [detentArmOuterRadius, detentArmOuterRadius]
                ]);
        };
        // Detent key (cylinder)
        intersection() {
            translate([detentArmInnerRadius, 0, 0])
                cylinder(r=detentDepth, h=detentArmHeight);
            // Clip off any part that extends beyond the detent arm
            cylinder(r=detentArmOuterRadius, h=detentArmHeight);
        };
    };
    
    module DetentArmCutout() {
        cutoutSpanClearanceLength = 1;
        cutoutDepthClearance = 0.5;
        cutoutHeightClearance = 0.3;
        cutoutSpanClearanceAngle = cutoutSpanClearanceLength / (2 * PI * ringInnerRadius) * 360;
        cutoutSpanAngle = detentArmSpanAngle + cutoutSpanClearanceAngle;
        cutoutDepth = detentArmThick + detentDepth + cutoutDepthClearance;
        cutoutHeight = detentArmHeight + cutoutHeightClearance;
        rotate([0, 0, -detentArmSpanAngle + detentKeySpanAngle/2])
            rotate_extrude2(angle=cutoutSpanAngle)
                polygon([
                    [0, 0],
                    [ringInnerRadius + cutoutDepth, 0],
                    [ringInnerRadius + cutoutDepth, cutoutHeight],
                    [0, cutoutHeight + ringInnerRadius + cutoutDepth]
                ]);
    };
    
    difference() {
        // Main shape of ring
        linear_extrude(ringHeight)
            difference() {
                // Outer polygon
                RegularPolygon(numCorners=numPositions, outerRadius=ringOuterRadius);
                // Center cavity
                circle(r=ringInnerRadius);
            };
        
        // Slots for lock prongs
        slotOuterRadius = osOuterRadius + osProngProtrusion + ringProngEndClearance;
        for (ang = latchAngles)
            rotate([0, 0, -ringSlotSpanAngle/2 + ang])
                rotate_extrude2(angle=ringSlotSpanAngle)
                    square([slotOuterRadius, 1000]);
        
        // Cutout for prong cover
        prongCoverHeight = prongHeight + prongCoverHeightClearance - isProngOffsetZ;
        prongCoverInnerRadius = ringOuterMinRadius - ringProngCoverThick;
        translate([0, 0, ringHeight - prongCoverHeight])
            difference() {
                cylinder(r=prongCoverInnerRadius, h=prongCoverHeight);
                // wedge shape
                rotate_extrude()
                    polygon([
                        [ringInnerRadius, 0],
                        [prongCoverInnerRadius, 0],
                        [prongCoverInnerRadius, prongCoverInnerRadius - ringInnerRadius]
                    ]);
            };
        
        // Cutouts for detent arms
        rotate([0, 0, detentArm1Angle])
            DetentArmCutout();
        rotate([0, 0, detentArm2Angle])
            mirror([0, 1, 0])
                DetentArmCutout();
    };
    
    // Detent arms
    rotate([0, 0, detentArm1Angle])
        DetentArm();
    rotate([0, 0, detentArm2Angle])
        mirror([0, 1, 0])
            DetentArm();
};

Ring();
